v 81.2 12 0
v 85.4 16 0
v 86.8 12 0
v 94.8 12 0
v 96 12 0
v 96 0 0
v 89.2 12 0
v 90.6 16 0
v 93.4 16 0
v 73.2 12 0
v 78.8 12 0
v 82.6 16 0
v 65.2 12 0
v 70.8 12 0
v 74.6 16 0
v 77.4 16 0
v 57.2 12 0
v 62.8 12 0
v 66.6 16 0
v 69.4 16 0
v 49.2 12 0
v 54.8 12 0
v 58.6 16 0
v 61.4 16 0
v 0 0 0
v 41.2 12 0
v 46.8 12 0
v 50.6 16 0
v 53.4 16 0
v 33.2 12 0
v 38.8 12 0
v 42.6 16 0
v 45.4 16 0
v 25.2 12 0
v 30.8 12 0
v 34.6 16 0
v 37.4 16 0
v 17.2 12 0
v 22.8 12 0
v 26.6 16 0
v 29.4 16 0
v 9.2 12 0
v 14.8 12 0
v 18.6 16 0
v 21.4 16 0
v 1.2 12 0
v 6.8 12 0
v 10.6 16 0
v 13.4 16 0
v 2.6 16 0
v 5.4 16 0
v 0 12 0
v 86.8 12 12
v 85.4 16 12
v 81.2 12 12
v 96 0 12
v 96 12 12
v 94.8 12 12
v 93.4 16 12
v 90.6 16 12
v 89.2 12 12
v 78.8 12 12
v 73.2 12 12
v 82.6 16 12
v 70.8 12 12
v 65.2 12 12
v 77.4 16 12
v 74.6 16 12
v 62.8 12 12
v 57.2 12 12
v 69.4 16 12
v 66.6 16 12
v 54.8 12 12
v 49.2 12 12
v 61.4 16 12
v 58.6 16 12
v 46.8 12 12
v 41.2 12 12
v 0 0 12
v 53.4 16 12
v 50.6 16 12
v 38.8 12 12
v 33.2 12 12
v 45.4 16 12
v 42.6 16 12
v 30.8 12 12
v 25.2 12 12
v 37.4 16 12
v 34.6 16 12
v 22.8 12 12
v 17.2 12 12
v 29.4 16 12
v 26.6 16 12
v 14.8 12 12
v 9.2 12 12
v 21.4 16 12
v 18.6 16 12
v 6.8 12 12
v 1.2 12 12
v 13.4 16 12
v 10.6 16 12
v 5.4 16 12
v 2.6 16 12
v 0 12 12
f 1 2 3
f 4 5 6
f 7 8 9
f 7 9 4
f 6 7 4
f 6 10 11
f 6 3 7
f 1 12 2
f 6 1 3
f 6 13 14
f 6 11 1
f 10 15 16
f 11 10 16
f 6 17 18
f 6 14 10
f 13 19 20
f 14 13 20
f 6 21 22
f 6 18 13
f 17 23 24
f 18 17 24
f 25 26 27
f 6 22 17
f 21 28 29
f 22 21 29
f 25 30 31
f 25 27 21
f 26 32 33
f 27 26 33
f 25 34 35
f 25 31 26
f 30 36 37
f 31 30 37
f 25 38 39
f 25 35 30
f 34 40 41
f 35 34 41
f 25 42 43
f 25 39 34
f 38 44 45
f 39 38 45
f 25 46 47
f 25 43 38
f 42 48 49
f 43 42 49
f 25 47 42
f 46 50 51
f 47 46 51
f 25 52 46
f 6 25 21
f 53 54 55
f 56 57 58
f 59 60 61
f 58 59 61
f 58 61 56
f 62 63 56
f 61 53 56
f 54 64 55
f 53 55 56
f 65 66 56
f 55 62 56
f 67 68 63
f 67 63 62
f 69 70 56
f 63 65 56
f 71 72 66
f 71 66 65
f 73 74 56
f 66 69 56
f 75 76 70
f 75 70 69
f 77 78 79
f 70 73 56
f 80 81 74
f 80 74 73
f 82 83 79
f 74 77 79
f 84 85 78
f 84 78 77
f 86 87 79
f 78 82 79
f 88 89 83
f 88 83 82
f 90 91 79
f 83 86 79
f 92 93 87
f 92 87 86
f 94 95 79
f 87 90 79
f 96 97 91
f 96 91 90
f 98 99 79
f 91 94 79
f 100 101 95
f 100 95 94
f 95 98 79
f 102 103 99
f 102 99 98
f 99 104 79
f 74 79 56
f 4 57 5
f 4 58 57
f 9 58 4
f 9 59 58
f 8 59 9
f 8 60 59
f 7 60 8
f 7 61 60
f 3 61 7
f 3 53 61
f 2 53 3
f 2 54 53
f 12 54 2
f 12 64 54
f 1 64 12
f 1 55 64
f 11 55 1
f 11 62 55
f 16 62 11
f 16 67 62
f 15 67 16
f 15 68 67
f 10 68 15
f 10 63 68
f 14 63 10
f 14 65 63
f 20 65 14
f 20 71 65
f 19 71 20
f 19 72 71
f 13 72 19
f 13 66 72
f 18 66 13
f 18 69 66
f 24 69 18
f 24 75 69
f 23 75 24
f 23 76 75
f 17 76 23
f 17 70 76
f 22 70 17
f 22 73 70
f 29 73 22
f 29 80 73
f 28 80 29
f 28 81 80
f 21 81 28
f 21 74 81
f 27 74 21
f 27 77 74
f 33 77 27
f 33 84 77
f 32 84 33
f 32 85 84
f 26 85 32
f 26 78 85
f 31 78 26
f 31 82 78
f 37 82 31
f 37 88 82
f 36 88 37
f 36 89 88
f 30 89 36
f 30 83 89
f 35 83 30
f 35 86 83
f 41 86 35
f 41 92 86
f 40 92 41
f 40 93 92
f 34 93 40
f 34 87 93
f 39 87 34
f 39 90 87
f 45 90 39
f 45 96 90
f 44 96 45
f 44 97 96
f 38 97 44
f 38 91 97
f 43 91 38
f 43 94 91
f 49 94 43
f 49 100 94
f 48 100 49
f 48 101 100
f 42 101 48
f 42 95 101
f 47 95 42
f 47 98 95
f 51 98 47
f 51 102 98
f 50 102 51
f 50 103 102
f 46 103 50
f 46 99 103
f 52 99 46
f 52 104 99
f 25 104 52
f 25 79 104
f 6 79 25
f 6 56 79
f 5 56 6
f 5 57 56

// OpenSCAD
$fn = 32;

// ----------------------------------------------------------------------
// Gear rack: 12 teeth, pitch 8 mm
// ----------------------------------------------------------------------

// --- parameters (mm) ---
teeth = 12;               // number of teeth
pitch = 8;                // tooth pitch, X
root_w = 5.6;             // tooth width at the root
tip_w = 2.8;              // tooth width at the tip
base_h = 12;              // rack body height, Y
tooth_h = 4;              // tooth height above the body
plate_t = 12;             // rack width, Z (extrusion height)

rack_l = teeth * pitch;  // overall length
total_h = base_h + tooth_h;  // overall height

profile = [[0, 0], [96, 0], [96, 12], [94.8, 12], [93.4, 16], [90.6, 16], [89.2, 12], [86.8, 12], [85.4, 16], [82.6, 16], [81.2, 12], [78.8, 12], [77.4, 16], [74.6, 16], [73.2, 12], [70.8, 12], [69.4, 16], [66.6, 16], [65.2, 12], [62.8, 12], [61.4, 16], [58.6, 16], [57.2, 12], [54.8, 12], [53.4, 16], [50.6, 16], [49.2, 12], [46.8, 12], [45.4, 16], [42.6, 16], [41.2, 12], [38.8, 12], [37.4, 16], [34.6, 16], [33.2, 12], [30.8, 12], [29.4, 16], [26.6, 16], [25.2, 12], [22.8, 12], [21.4, 16], [18.6, 16], [17.2, 12], [14.8, 12], [13.4, 16], [10.6, 16], [9.2, 12], [6.8, 12], [5.4, 16], [2.6, 16], [1.2, 12], [0, 12]];  // primary outline, 52 points, counter clockwise

// --- the one profile operation ---
linear_extrude(height = plate_t) polygon(points = profile);
